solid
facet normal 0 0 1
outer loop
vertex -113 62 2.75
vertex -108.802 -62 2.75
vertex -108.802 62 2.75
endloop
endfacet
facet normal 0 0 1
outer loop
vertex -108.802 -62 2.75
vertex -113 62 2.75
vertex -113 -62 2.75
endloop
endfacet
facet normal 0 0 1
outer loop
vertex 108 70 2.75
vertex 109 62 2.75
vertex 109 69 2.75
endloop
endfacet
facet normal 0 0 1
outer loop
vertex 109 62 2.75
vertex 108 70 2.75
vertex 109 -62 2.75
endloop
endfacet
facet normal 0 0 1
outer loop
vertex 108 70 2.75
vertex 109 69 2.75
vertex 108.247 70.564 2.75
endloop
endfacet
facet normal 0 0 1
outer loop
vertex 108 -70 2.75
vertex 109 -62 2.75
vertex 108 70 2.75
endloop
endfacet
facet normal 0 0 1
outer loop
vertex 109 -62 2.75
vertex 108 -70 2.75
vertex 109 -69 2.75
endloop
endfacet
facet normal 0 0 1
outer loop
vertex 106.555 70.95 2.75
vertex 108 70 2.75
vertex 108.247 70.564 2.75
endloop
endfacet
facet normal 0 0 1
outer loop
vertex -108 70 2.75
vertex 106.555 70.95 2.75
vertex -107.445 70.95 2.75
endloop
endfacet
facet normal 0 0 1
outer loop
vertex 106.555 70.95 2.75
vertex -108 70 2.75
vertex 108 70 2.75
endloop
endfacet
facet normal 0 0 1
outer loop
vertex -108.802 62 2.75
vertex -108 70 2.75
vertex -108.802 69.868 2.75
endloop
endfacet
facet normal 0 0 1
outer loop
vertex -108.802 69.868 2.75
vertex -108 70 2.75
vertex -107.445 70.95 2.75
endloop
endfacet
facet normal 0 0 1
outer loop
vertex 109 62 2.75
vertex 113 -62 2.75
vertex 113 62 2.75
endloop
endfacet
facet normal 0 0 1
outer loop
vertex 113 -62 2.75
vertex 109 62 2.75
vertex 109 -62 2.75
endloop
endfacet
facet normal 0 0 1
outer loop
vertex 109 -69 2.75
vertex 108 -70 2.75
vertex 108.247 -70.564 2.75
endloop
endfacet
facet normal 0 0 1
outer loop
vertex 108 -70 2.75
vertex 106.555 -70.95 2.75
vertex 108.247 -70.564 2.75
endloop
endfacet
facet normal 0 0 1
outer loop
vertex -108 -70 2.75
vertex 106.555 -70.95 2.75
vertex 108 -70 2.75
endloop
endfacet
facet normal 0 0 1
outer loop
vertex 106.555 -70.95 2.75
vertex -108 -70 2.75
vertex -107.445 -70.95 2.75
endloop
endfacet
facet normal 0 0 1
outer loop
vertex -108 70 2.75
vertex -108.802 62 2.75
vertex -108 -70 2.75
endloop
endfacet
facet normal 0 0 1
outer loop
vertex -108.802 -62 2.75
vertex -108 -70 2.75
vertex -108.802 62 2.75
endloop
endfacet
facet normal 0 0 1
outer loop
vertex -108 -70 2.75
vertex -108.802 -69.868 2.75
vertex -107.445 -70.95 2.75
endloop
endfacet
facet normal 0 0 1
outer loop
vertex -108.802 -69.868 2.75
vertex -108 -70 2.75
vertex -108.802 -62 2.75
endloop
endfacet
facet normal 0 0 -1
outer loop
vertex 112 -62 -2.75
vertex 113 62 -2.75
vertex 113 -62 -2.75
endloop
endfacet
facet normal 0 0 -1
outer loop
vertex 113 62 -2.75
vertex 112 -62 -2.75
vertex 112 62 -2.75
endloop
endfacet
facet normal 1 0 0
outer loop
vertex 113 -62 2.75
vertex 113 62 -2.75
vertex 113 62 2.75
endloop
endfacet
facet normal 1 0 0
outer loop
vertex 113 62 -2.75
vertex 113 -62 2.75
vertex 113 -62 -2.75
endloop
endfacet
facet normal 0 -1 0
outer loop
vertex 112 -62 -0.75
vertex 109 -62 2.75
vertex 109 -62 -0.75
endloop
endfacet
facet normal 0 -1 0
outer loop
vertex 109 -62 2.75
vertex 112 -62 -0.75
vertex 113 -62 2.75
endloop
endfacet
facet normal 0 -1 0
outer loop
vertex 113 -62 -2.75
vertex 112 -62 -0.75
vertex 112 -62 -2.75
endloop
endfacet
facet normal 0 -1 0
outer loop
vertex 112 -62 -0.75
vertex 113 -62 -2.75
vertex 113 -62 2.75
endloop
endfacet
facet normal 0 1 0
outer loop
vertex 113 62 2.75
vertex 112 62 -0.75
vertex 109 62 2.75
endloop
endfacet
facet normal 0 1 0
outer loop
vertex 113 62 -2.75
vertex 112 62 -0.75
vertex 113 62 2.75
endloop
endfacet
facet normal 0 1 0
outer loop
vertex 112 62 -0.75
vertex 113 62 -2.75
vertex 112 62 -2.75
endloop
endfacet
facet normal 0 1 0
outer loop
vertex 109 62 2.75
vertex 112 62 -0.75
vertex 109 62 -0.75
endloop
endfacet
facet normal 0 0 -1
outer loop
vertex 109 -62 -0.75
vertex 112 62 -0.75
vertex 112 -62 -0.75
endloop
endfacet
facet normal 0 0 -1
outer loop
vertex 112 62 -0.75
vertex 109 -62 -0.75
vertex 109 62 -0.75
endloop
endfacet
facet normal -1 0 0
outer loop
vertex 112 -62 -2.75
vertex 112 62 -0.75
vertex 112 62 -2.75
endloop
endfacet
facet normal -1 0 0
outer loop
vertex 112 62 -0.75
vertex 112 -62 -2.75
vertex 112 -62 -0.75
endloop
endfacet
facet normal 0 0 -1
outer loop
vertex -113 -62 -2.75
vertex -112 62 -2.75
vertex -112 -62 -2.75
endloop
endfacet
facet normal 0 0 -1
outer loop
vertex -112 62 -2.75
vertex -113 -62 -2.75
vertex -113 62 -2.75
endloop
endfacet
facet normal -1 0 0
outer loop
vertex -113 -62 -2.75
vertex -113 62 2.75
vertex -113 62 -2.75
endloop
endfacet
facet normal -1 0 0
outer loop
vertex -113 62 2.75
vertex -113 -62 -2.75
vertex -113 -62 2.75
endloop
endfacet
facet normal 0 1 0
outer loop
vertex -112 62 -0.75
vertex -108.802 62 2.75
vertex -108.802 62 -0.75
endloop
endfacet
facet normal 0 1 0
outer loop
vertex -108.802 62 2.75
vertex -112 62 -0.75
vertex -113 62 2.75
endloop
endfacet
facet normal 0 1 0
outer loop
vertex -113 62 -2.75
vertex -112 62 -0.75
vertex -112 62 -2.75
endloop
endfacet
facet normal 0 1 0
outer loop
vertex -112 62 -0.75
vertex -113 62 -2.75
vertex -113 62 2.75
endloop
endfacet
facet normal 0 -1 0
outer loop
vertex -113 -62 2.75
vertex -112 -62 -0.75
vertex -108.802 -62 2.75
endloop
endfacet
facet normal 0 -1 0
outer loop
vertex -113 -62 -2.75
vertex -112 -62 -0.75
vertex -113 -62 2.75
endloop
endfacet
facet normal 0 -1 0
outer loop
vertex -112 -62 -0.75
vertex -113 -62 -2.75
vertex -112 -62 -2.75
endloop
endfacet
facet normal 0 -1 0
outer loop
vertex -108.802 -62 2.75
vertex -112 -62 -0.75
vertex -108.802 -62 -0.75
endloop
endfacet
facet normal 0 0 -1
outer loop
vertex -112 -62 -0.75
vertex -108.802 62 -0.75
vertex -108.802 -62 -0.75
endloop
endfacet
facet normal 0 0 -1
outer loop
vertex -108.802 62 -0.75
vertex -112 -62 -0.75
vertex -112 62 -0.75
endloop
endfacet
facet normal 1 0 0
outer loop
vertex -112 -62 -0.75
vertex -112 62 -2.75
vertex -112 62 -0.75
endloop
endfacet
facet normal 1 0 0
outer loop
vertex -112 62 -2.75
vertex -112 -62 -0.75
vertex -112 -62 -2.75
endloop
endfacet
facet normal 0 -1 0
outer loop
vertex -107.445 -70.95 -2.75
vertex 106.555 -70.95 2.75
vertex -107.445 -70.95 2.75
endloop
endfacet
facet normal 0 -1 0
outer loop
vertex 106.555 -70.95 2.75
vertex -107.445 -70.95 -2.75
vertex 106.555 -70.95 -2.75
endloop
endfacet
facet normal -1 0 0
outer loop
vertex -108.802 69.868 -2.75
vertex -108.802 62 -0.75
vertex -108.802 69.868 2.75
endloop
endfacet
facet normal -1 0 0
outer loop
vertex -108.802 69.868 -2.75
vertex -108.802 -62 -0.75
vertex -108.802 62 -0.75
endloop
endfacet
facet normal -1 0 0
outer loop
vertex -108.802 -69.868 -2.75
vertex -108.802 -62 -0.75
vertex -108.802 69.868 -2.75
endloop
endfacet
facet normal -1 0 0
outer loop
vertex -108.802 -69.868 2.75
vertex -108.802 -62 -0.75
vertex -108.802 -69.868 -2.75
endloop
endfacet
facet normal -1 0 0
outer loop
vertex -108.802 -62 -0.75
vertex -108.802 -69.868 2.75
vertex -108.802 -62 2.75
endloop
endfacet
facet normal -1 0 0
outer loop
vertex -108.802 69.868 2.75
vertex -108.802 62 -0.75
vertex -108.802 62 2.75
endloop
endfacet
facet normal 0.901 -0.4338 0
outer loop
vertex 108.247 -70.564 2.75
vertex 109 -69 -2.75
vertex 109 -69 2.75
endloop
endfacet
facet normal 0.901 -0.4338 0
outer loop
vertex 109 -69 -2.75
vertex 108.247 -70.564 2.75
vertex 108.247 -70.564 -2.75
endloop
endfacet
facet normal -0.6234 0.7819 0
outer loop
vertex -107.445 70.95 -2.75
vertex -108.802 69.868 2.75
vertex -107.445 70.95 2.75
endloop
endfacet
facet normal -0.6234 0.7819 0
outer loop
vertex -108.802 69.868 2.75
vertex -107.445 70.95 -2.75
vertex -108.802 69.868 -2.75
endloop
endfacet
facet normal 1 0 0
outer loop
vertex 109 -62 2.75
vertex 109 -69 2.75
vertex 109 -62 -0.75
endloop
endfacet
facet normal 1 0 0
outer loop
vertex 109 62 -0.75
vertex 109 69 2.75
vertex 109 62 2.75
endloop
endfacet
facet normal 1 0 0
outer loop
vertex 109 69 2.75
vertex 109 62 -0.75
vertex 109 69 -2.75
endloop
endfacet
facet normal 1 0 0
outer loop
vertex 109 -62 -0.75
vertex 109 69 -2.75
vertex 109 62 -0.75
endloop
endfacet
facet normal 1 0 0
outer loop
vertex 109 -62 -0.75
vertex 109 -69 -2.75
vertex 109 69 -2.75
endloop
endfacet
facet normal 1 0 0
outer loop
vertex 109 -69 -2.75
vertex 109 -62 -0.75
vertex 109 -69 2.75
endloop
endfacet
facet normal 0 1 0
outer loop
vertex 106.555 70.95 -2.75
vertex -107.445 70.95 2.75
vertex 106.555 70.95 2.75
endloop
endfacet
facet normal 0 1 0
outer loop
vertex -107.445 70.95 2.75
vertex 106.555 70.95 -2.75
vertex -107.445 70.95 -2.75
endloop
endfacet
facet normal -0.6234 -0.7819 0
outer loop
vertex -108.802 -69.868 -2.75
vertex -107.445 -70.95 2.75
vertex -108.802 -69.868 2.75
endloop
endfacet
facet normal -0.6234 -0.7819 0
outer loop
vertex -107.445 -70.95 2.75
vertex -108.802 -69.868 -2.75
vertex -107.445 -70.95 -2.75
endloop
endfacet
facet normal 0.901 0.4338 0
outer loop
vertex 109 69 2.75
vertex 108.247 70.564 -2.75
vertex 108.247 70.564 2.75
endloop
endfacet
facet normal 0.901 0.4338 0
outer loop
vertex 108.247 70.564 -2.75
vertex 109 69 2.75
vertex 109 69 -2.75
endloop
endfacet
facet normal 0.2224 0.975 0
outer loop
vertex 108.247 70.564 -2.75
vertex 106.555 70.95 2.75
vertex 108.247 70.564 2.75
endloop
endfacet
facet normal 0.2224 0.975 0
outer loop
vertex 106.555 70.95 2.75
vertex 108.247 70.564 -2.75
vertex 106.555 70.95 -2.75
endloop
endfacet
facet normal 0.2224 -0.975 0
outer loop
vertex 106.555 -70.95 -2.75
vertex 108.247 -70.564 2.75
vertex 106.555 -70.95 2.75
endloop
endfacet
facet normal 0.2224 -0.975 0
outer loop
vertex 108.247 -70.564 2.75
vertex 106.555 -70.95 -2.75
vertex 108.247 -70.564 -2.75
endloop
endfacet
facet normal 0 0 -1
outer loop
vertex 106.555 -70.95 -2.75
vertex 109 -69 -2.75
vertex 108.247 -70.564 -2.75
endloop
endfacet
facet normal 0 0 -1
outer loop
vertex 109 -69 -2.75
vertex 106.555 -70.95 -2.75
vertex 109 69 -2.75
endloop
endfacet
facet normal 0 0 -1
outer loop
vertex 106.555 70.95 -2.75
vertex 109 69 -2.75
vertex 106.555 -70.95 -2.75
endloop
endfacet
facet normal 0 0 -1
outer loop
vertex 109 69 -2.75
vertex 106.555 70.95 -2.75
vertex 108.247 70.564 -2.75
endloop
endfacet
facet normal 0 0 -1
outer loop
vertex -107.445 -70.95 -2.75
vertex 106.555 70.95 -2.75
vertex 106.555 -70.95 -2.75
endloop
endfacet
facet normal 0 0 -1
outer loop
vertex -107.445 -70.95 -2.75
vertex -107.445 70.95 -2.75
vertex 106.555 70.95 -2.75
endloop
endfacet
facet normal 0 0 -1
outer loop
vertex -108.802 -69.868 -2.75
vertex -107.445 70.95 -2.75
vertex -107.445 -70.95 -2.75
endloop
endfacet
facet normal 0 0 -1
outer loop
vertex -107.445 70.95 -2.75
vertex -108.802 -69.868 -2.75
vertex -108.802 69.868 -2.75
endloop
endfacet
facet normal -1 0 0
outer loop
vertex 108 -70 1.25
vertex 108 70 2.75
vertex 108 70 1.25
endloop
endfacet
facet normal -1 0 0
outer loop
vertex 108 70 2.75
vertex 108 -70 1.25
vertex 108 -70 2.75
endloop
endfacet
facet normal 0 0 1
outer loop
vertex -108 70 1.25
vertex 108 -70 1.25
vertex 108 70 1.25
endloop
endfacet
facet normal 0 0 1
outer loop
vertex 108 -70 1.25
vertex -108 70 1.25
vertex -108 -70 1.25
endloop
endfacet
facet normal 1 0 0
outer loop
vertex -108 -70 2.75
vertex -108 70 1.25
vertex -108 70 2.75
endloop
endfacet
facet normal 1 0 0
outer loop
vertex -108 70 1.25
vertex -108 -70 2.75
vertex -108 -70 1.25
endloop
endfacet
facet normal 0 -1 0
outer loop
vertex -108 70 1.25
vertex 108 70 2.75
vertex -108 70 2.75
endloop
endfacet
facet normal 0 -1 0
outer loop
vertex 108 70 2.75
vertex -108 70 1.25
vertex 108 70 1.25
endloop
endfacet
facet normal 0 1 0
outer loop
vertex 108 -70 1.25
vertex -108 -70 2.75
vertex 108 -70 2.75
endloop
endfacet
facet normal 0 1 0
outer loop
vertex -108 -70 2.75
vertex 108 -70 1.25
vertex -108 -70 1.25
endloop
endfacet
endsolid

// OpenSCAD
// these should probably all live within the modules
// x dimension
base_tray_width = 216;

// y dimension
base_tray_depth = 140;

// z dimension
base_tray_thickness = 5.5;

wing_width = 5;
wing_depth = 124;

module wing () {
  difference() {
    // wing TODO why do I need the + 3 in depth??
    cube([wing_width, wing_depth, base_tray_thickness], center=true);

    // wing cutout
        translate([1, 0, -3.5]) cube([wing_width, wing_depth + 2, base_tray_thickness], center=true);
  }
}

module base_platform() {
  corner_radius = 2;

  linear_extrude(base_tray_thickness, center=true)
  minkowski() {
    square([base_tray_width - corner_radius, base_tray_depth - corner_radius], center=true);
    circle(corner_radius, center=true);
  }
}

module base_tray () {

  base_platform();
  // right wing
  translate([(base_tray_width / 2) + (wing_width / 2), 0, 0])
    rotate([0, 0, 180])
    wing();

  // left wing
  translate([-((base_tray_width / 2) + (wing_width / 2)), 0, 0])
    wing();
}

module magnet_sheet_tray (depth_of_hollow, offset_from_edge) {

  difference() {
    base_tray();
    translate([0, 0, base_tray_thickness - depth_of_hollow])
    cube([base_tray_width, base_tray_depth, base_tray_thickness], center=true);
  }
}


magnet_sheet_tray(1.5, 2);
